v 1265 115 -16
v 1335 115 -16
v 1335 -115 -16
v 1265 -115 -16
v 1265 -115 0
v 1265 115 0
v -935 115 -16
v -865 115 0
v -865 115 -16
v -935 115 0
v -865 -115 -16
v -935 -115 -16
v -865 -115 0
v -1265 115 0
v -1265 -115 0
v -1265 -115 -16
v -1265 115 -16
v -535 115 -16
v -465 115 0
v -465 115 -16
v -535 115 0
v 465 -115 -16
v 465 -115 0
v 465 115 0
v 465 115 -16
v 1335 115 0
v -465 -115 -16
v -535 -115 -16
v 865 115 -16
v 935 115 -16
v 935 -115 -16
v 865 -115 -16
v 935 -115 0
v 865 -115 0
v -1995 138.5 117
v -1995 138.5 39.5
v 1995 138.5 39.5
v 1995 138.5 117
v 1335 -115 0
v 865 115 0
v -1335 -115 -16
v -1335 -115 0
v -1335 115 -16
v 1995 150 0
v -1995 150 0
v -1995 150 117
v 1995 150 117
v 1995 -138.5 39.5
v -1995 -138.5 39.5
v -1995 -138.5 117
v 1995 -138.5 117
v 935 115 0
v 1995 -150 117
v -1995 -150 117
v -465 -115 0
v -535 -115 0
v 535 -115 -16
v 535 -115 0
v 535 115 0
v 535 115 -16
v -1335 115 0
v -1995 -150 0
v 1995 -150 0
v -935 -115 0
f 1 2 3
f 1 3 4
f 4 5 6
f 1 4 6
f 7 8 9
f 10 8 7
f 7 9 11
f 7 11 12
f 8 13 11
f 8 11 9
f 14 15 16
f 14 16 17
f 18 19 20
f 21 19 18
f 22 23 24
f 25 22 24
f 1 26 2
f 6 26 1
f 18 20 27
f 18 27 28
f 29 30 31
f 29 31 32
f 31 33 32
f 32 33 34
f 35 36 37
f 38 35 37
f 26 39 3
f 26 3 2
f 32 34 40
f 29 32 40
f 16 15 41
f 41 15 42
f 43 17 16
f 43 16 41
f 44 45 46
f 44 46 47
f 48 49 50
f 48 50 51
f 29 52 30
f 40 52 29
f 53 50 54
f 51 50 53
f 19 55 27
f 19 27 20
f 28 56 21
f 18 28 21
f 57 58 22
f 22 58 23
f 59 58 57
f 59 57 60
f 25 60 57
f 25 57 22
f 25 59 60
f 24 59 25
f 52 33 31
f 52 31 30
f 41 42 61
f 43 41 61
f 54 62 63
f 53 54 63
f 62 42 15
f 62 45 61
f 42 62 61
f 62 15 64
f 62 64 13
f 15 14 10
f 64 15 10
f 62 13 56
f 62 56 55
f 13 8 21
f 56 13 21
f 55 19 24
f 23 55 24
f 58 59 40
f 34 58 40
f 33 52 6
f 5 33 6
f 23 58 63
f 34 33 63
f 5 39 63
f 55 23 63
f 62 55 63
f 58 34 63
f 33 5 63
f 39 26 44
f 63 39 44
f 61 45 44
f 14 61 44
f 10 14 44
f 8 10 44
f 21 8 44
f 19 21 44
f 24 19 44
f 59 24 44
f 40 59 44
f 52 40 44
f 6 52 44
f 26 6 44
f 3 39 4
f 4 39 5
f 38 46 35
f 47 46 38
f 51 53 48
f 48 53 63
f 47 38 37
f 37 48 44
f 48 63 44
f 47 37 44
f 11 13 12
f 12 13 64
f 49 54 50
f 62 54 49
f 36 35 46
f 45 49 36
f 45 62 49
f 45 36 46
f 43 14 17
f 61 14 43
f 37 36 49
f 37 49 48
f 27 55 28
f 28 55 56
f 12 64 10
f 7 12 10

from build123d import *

# Parameters (mm, degrees)
SKETCH_1_W         = 3990
SKETCH_1_H         = 300
EXTRUDE_1314_DEPTH = 39.5
SKETCH_2_W         = 3990
SKETCH_2_H         = 11.5
EXTRUDE_1_DEPTH    = 77.5
SKETCH_3_W         = 70
SKETCH_3_H         = 230
EXTRUDE_2_DEPTH    = 16


with BuildPart() as part:
    # 草图1 → Extrude 1314 (new body)
    with BuildSketch(Plane.XY):
        Rectangle(SKETCH_1_W, SKETCH_1_H)
    extrude(amount=EXTRUDE_1314_DEPTH)

    # 草图2 → 凸台-拉伸1 (add)
    with BuildSketch(Plane.XY.offset(39.5)):
        with Locations((0, 144.25)):
            Rectangle(SKETCH_2_W, SKETCH_2_H)
        with Locations((0, -144.25)):
            Rectangle(SKETCH_2_W, SKETCH_2_H)
    extrude(amount=EXTRUDE_1_DEPTH)

    # 草图3 → 凸台-拉伸2 (add)
    with BuildSketch(Plane(origin=(0, 0, 0), x_dir=(-1, 0, 0), z_dir=(0, 0, -1))):
        with Locations((1300, 0)):
            Rectangle(SKETCH_3_W, SKETCH_3_H)
        with Locations((900, 0)):
            Rectangle(SKETCH_3_W, SKETCH_3_H)
        with Locations((-1300, 0)):
            Rectangle(SKETCH_3_W, SKETCH_3_H)
        with Locations((500, 0)):
            Rectangle(SKETCH_3_W, SKETCH_3_H)
        with Locations((-900, 0)):
            Rectangle(SKETCH_3_W, SKETCH_3_H)
        with Locations((-500, 0)):
            Rectangle(SKETCH_3_W, SKETCH_3_H)
    extrude(amount=EXTRUDE_2_DEPTH)


solid = part.part
